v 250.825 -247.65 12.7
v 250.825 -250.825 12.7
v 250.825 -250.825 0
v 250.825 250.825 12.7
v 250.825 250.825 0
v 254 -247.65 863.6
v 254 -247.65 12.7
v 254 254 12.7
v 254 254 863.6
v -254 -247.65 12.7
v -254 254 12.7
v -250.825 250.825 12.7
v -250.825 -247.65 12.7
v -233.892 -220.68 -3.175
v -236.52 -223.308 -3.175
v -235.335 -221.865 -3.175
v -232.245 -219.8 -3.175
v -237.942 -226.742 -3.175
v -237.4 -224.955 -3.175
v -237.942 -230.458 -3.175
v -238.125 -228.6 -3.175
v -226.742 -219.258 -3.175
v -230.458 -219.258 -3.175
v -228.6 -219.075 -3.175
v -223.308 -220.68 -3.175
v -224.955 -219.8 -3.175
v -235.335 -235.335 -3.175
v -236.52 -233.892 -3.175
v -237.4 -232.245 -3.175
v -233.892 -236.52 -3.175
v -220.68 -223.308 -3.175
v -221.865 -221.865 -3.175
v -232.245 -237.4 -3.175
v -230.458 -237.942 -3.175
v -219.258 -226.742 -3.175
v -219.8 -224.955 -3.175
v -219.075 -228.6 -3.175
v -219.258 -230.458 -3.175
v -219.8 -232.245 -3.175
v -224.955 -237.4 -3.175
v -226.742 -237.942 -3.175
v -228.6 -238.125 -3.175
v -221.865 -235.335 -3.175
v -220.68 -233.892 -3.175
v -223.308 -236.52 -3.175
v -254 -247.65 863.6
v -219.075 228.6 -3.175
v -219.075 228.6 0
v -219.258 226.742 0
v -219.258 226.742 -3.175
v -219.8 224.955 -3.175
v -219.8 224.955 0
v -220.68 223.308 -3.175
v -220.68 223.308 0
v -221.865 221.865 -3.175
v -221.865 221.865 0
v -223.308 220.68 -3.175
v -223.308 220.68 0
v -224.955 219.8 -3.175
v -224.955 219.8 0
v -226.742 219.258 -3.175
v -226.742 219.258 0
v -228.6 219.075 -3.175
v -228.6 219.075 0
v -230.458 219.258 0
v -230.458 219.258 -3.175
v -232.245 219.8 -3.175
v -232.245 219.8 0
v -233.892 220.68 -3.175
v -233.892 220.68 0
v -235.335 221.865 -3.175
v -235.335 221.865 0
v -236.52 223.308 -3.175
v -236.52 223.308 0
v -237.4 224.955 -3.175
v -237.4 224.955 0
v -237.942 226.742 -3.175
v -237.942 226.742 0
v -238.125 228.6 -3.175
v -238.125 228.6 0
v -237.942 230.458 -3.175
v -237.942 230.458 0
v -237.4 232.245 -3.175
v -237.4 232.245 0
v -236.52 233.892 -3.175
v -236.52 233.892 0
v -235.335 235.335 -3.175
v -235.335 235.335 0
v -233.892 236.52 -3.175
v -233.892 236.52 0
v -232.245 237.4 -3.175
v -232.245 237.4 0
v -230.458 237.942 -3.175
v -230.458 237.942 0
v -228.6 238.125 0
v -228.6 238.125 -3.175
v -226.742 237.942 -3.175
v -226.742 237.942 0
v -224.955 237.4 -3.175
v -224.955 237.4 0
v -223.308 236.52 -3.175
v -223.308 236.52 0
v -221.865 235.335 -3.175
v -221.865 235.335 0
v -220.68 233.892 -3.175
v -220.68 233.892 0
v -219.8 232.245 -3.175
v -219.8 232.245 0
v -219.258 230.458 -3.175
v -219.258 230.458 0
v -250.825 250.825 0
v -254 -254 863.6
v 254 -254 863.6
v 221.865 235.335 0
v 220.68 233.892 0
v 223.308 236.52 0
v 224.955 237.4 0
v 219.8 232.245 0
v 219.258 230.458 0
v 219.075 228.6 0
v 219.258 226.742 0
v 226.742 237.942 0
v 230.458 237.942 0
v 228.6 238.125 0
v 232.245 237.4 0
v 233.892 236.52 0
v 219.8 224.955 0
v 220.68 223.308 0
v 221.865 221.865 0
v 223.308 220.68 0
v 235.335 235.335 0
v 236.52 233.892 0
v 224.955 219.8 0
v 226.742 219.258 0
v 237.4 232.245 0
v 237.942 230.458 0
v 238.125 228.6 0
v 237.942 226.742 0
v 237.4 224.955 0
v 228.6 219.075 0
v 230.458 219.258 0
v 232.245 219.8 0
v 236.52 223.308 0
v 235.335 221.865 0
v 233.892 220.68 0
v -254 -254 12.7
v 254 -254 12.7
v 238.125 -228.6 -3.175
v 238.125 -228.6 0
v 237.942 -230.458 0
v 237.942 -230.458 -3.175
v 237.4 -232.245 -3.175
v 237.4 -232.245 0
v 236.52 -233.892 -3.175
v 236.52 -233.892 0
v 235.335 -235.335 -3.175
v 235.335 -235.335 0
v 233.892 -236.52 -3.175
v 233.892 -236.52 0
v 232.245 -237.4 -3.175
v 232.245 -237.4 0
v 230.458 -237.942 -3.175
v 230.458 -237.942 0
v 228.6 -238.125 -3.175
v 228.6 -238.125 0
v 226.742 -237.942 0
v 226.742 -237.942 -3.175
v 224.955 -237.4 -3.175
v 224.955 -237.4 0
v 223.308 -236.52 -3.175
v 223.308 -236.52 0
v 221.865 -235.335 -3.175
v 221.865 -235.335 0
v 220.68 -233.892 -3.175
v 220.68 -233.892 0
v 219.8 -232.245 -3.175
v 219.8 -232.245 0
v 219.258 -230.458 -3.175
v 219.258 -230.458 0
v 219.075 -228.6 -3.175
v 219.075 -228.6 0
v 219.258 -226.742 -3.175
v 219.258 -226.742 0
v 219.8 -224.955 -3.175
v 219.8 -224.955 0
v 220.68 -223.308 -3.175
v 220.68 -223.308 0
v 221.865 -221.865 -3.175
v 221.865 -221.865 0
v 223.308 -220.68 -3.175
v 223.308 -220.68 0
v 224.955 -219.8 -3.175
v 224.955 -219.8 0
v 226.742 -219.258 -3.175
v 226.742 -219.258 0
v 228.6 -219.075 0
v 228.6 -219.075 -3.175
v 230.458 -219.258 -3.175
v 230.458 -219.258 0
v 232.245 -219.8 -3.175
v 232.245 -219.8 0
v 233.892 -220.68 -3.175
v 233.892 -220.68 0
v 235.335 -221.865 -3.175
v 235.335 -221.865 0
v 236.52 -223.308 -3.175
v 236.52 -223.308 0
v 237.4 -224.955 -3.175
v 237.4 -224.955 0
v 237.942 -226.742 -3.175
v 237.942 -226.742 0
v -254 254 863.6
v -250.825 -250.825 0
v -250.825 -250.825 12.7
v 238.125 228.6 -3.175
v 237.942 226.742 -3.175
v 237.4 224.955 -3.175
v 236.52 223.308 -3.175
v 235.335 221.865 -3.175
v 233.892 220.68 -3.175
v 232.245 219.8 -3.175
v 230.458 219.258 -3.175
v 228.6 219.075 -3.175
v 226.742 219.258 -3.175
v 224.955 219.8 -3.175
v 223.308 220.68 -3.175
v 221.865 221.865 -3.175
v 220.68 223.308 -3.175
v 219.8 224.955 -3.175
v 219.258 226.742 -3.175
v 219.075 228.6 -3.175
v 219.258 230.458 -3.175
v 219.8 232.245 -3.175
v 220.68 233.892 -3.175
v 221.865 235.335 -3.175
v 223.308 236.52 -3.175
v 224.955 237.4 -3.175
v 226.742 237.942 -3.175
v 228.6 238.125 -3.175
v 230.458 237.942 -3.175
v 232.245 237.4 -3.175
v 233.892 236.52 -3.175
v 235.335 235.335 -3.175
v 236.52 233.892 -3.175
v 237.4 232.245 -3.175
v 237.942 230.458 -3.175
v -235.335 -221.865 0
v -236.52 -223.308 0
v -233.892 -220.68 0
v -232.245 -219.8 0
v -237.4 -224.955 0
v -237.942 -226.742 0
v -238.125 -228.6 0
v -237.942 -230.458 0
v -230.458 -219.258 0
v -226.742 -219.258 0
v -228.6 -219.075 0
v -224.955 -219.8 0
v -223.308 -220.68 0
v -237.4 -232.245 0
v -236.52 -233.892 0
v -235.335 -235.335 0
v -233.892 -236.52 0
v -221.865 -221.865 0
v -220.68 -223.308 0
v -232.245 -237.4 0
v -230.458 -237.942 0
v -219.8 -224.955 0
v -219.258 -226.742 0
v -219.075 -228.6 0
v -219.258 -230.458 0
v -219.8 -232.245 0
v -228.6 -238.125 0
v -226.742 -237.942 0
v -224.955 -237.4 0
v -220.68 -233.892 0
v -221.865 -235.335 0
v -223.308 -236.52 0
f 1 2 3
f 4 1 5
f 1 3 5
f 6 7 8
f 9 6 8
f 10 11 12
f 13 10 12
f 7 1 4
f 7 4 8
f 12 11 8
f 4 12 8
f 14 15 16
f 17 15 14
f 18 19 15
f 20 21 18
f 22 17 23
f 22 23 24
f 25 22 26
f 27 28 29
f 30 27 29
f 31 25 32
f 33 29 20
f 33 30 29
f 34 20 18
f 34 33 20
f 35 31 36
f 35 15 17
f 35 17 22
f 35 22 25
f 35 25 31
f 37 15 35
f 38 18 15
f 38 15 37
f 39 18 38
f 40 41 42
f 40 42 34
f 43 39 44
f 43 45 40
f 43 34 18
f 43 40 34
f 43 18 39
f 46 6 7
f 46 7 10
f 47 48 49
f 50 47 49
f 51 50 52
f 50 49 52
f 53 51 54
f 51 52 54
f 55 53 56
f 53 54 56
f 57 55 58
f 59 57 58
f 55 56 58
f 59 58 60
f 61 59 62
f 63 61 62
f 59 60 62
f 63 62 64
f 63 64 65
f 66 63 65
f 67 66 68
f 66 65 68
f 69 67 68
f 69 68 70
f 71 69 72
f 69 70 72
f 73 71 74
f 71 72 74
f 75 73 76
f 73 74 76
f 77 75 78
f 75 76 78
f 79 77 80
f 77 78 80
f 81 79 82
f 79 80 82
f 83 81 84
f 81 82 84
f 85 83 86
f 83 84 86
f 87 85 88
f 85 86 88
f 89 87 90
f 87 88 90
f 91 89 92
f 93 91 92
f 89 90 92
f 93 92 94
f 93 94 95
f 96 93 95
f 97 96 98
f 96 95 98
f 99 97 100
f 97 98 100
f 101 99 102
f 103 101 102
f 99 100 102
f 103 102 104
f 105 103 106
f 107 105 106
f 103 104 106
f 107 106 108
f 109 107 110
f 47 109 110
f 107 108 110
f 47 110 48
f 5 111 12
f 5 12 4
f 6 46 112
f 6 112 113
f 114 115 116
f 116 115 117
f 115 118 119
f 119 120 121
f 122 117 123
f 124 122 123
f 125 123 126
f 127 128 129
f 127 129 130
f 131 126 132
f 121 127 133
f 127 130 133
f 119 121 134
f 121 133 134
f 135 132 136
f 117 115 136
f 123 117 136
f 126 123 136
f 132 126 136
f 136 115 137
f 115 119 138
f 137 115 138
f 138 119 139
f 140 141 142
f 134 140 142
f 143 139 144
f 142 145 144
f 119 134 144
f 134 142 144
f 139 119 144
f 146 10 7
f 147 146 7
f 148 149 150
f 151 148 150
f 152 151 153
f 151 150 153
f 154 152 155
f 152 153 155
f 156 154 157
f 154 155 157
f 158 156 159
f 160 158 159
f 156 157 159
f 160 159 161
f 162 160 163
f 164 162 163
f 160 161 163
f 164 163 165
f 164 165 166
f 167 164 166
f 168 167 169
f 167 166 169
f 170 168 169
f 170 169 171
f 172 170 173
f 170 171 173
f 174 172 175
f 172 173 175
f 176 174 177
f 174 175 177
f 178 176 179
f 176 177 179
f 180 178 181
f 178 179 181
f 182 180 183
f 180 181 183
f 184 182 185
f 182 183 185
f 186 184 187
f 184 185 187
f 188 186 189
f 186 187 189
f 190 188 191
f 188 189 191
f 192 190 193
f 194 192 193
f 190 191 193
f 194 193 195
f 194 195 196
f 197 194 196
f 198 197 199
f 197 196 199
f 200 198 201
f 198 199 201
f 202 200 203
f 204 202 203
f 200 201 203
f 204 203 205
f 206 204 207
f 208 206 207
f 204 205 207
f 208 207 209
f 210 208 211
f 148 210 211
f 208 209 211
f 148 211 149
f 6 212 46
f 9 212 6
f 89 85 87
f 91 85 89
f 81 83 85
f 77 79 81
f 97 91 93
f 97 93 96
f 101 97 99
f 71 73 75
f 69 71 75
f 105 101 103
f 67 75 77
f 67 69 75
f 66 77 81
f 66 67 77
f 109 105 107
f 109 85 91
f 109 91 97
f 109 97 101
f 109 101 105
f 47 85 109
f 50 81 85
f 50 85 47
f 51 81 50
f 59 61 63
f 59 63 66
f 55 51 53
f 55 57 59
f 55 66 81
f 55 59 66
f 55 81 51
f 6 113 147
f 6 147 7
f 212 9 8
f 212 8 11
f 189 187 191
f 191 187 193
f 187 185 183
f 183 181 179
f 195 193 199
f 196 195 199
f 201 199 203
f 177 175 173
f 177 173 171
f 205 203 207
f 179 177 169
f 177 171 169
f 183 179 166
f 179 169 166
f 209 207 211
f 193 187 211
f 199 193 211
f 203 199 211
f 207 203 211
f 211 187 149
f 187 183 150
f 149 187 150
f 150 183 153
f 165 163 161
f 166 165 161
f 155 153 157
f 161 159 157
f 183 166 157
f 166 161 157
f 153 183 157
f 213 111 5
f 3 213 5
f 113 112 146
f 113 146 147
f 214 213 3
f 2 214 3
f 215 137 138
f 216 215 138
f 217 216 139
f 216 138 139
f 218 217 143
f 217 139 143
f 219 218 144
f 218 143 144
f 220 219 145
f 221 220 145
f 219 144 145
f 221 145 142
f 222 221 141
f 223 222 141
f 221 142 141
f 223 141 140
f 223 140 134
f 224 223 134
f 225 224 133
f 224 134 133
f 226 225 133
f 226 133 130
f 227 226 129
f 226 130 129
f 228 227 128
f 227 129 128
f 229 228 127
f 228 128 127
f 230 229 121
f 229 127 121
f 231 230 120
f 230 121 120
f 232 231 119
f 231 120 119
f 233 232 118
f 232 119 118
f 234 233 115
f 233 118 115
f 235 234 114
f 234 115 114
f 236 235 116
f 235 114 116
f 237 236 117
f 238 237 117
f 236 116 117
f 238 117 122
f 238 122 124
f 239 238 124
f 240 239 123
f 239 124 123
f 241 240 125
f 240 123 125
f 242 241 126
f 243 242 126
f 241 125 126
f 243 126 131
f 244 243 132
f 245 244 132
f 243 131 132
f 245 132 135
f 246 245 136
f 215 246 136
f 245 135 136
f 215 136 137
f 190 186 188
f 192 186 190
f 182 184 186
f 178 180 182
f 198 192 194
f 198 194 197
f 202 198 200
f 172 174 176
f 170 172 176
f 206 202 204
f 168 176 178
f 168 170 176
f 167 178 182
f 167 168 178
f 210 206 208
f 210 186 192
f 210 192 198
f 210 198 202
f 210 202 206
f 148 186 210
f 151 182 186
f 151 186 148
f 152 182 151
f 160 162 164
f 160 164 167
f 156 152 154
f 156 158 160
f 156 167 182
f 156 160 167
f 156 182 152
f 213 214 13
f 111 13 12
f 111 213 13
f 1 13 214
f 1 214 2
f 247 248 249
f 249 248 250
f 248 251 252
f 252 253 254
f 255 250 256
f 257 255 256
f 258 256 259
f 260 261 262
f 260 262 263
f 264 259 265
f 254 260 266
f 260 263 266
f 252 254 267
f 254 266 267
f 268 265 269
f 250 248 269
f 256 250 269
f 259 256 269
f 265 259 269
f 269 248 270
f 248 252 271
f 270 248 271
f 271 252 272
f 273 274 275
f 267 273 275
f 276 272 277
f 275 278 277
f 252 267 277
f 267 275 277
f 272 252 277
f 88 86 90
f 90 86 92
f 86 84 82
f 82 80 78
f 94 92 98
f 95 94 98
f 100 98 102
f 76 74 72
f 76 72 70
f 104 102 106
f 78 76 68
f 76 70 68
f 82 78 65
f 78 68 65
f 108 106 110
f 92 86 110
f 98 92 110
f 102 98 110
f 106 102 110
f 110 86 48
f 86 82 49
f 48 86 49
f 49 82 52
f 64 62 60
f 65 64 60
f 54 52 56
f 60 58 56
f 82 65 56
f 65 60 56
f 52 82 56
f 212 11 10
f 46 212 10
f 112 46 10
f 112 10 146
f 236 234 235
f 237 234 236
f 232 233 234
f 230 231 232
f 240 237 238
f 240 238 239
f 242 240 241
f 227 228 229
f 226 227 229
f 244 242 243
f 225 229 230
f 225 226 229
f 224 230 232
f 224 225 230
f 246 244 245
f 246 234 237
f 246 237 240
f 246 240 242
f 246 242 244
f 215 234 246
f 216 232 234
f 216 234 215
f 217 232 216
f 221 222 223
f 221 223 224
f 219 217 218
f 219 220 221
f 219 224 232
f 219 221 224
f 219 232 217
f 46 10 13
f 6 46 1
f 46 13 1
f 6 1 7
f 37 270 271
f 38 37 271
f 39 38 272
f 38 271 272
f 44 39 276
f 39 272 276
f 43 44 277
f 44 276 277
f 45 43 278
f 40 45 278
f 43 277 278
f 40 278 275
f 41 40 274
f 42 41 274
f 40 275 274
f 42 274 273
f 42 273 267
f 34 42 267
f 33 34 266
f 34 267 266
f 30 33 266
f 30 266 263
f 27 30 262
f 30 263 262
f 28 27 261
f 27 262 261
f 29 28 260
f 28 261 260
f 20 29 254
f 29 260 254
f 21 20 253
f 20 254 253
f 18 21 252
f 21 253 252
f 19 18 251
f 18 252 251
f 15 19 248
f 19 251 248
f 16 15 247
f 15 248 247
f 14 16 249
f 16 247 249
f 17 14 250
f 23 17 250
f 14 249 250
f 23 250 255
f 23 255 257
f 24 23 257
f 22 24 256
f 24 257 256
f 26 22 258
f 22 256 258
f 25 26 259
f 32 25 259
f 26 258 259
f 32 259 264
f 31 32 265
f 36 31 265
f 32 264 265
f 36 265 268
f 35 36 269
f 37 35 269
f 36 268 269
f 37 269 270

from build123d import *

# Parameters (mm, degrees)
F0_W     = 501.65
F0_H     = 501.65
F1_DEPTH = 12.7
F2_W     = 501.65
F2_H     = 498.475
F3_DEPTH = 850.9
F2_H_2   = 3.175
F4_DEPTH = 850.9
F5_R     = 9.525
F6_DEPTH = 3.175


with BuildPart() as f1:
    # F0 (on Top) → F1 (new body)
    with BuildSketch(Plane.XY):
        Rectangle(F0_W, F0_H)
    extrude(amount=F1_DEPTH)

    # F2 (on face) → F3 (join)
    with BuildSketch(Plane.XY.offset(12.7)):
        with Locations((0, 1.5875)):
            Rectangle(F2_W, F2_H)
        Polygon((254, 254), (-254, 254), (-254, -247.65), (-250.825, -247.65), (-250.825, 250.825), (250.825, 250.825), (250.825, -247.65), (254, -247.65), align=None)
    extrude(amount=F3_DEPTH)


with BuildPart() as f4:
    # F2 (on face) → F4 (new body)
    with BuildSketch(Plane.XY.offset(12.7)):
        with Locations((0, -249.2375)):
            Rectangle(F2_W, F2_H_2)
        Polygon((-250.825, -247.65), (-254, -247.65), (-254, -254), (254, -254), (254, -247.65), (250.825, -247.65), (250.825, -250.825), (-250.825, -250.825), align=None)
    extrude(amount=F4_DEPTH)


with BuildPart() as f6:
    # F5 (on face) → F6 (new body)
    with BuildSketch(Plane(origin=(0, 0, 0), x_dir=(1, 0, 0), z_dir=(0, 0, -1))):
        with Locations((-228.6, 228.6)):
            Circle(F5_R)
    extrude(amount=F6_DEPTH)


with BuildPart() as f6b:
    # F5 (on face) → F6, piece 2 (new body)
    with BuildSketch(Plane(origin=(0, 0, 0), x_dir=(1, 0, 0), z_dir=(0, 0, -1))):
        with Locations((-228.6, -228.6)):
            Circle(F5_R)
    extrude(amount=F6_DEPTH)


with BuildPart() as f6c:
    # F5 (on face) → F6, piece 3 (new body)
    with BuildSketch(Plane(origin=(0, 0, 0), x_dir=(1, 0, 0), z_dir=(0, 0, -1))):
        with Locations((228.6, 228.6)):
            Circle(F5_R)
    extrude(amount=F6_DEPTH)


with BuildPart() as f6d:
    # F5 (on face) → F6, piece 4 (new body)
    with BuildSketch(Plane(origin=(0, 0, 0), x_dir=(1, 0, 0), z_dir=(0, 0, -1))):
        with Locations((228.6, -228.6)):
            Circle(F5_R)
    extrude(amount=F6_DEPTH)


solid = Compound([f1.part, f4.part, f6.part, f6b.part, f6c.part, f6d.part])
